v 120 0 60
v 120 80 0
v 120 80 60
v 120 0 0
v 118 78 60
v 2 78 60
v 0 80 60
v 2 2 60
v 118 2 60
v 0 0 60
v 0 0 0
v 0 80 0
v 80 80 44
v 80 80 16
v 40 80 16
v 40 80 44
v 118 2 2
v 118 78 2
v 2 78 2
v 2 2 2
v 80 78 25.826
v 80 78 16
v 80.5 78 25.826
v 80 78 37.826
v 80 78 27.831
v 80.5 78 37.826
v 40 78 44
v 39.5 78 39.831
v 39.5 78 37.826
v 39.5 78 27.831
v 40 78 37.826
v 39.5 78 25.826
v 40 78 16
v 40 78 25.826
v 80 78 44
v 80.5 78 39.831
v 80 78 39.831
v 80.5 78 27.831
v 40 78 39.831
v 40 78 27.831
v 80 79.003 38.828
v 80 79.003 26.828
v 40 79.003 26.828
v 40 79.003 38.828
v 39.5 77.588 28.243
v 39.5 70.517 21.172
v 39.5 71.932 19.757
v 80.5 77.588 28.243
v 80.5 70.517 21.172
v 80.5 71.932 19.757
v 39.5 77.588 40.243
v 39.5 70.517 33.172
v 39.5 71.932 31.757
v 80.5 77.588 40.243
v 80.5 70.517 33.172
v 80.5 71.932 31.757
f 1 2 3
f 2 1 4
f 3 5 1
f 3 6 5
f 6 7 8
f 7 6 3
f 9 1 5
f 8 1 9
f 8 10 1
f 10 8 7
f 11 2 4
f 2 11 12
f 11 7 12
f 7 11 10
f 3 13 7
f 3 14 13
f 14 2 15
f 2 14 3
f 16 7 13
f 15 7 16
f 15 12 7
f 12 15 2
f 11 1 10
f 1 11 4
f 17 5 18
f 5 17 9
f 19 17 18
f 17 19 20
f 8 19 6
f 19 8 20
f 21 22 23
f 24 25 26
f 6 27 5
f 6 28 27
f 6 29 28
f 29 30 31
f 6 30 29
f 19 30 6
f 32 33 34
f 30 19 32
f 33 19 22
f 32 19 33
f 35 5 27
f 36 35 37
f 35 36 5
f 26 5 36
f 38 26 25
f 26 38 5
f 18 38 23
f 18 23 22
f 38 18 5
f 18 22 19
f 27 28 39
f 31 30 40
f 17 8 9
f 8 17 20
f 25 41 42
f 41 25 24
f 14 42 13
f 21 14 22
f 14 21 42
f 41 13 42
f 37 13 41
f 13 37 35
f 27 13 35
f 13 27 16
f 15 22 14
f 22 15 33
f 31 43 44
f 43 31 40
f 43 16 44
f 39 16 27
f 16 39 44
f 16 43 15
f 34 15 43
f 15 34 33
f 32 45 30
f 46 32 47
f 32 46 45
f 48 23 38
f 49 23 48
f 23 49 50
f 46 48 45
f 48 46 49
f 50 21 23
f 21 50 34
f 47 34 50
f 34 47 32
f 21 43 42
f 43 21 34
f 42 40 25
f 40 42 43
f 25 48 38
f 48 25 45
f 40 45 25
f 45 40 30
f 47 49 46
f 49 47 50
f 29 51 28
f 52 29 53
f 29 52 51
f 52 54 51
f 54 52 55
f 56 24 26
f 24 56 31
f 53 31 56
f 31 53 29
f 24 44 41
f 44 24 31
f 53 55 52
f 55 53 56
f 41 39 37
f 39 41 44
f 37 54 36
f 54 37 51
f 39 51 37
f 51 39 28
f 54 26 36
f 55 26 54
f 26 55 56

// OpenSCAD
$fn = 32;

// ----------------------------------------------------------------------
// Vent box: louvers enclosure
// ----------------------------------------------------------------------

// --- parameters (mm) ---
box_l = 120;              // box length, X
box_w = 80;               // box width, Y
box_h = 60;               // box height, Z
wall_t = 2;               // shell wall thickness
win_l = 40;               // vent window width, X
win_h = 28;               // vent window height, Z
slat_t = 2;               // louver slat thickness
slat_d = 10;              // louver slat depth
slat_a = 45;              // louver slat angle, degrees
slat_pitch = 12;          // louver pitch
slat_yc = 74.76;          // slat centreline Y

win_z0 = (box_h - win_h) / 2;  // window lower edge Z
n_slats = 2;  // louver count
slat_z0 = win_z0 + (win_h - (n_slats - 1) * slat_pitch) / 2;

difference() {
  union() {
    difference() {
      cube([box_l, box_w, box_h]);
  translate([wall_t, wall_t, wall_t])
    cube([box_l - 2 * wall_t, box_w - 2 * wall_t, box_h]);
  translate([(box_l - win_l) / 2, box_w - wall_t - 1, win_z0])
    cube([win_l, wall_t + 2, win_h]);
    }
    for (i = [0 : n_slats - 1])
      translate([box_l / 2, slat_yc, slat_z0 + i * slat_pitch])
        rotate([slat_a, 0, 0])
          cube([win_l + 1, slat_d, slat_t], center = true);
  }
}
